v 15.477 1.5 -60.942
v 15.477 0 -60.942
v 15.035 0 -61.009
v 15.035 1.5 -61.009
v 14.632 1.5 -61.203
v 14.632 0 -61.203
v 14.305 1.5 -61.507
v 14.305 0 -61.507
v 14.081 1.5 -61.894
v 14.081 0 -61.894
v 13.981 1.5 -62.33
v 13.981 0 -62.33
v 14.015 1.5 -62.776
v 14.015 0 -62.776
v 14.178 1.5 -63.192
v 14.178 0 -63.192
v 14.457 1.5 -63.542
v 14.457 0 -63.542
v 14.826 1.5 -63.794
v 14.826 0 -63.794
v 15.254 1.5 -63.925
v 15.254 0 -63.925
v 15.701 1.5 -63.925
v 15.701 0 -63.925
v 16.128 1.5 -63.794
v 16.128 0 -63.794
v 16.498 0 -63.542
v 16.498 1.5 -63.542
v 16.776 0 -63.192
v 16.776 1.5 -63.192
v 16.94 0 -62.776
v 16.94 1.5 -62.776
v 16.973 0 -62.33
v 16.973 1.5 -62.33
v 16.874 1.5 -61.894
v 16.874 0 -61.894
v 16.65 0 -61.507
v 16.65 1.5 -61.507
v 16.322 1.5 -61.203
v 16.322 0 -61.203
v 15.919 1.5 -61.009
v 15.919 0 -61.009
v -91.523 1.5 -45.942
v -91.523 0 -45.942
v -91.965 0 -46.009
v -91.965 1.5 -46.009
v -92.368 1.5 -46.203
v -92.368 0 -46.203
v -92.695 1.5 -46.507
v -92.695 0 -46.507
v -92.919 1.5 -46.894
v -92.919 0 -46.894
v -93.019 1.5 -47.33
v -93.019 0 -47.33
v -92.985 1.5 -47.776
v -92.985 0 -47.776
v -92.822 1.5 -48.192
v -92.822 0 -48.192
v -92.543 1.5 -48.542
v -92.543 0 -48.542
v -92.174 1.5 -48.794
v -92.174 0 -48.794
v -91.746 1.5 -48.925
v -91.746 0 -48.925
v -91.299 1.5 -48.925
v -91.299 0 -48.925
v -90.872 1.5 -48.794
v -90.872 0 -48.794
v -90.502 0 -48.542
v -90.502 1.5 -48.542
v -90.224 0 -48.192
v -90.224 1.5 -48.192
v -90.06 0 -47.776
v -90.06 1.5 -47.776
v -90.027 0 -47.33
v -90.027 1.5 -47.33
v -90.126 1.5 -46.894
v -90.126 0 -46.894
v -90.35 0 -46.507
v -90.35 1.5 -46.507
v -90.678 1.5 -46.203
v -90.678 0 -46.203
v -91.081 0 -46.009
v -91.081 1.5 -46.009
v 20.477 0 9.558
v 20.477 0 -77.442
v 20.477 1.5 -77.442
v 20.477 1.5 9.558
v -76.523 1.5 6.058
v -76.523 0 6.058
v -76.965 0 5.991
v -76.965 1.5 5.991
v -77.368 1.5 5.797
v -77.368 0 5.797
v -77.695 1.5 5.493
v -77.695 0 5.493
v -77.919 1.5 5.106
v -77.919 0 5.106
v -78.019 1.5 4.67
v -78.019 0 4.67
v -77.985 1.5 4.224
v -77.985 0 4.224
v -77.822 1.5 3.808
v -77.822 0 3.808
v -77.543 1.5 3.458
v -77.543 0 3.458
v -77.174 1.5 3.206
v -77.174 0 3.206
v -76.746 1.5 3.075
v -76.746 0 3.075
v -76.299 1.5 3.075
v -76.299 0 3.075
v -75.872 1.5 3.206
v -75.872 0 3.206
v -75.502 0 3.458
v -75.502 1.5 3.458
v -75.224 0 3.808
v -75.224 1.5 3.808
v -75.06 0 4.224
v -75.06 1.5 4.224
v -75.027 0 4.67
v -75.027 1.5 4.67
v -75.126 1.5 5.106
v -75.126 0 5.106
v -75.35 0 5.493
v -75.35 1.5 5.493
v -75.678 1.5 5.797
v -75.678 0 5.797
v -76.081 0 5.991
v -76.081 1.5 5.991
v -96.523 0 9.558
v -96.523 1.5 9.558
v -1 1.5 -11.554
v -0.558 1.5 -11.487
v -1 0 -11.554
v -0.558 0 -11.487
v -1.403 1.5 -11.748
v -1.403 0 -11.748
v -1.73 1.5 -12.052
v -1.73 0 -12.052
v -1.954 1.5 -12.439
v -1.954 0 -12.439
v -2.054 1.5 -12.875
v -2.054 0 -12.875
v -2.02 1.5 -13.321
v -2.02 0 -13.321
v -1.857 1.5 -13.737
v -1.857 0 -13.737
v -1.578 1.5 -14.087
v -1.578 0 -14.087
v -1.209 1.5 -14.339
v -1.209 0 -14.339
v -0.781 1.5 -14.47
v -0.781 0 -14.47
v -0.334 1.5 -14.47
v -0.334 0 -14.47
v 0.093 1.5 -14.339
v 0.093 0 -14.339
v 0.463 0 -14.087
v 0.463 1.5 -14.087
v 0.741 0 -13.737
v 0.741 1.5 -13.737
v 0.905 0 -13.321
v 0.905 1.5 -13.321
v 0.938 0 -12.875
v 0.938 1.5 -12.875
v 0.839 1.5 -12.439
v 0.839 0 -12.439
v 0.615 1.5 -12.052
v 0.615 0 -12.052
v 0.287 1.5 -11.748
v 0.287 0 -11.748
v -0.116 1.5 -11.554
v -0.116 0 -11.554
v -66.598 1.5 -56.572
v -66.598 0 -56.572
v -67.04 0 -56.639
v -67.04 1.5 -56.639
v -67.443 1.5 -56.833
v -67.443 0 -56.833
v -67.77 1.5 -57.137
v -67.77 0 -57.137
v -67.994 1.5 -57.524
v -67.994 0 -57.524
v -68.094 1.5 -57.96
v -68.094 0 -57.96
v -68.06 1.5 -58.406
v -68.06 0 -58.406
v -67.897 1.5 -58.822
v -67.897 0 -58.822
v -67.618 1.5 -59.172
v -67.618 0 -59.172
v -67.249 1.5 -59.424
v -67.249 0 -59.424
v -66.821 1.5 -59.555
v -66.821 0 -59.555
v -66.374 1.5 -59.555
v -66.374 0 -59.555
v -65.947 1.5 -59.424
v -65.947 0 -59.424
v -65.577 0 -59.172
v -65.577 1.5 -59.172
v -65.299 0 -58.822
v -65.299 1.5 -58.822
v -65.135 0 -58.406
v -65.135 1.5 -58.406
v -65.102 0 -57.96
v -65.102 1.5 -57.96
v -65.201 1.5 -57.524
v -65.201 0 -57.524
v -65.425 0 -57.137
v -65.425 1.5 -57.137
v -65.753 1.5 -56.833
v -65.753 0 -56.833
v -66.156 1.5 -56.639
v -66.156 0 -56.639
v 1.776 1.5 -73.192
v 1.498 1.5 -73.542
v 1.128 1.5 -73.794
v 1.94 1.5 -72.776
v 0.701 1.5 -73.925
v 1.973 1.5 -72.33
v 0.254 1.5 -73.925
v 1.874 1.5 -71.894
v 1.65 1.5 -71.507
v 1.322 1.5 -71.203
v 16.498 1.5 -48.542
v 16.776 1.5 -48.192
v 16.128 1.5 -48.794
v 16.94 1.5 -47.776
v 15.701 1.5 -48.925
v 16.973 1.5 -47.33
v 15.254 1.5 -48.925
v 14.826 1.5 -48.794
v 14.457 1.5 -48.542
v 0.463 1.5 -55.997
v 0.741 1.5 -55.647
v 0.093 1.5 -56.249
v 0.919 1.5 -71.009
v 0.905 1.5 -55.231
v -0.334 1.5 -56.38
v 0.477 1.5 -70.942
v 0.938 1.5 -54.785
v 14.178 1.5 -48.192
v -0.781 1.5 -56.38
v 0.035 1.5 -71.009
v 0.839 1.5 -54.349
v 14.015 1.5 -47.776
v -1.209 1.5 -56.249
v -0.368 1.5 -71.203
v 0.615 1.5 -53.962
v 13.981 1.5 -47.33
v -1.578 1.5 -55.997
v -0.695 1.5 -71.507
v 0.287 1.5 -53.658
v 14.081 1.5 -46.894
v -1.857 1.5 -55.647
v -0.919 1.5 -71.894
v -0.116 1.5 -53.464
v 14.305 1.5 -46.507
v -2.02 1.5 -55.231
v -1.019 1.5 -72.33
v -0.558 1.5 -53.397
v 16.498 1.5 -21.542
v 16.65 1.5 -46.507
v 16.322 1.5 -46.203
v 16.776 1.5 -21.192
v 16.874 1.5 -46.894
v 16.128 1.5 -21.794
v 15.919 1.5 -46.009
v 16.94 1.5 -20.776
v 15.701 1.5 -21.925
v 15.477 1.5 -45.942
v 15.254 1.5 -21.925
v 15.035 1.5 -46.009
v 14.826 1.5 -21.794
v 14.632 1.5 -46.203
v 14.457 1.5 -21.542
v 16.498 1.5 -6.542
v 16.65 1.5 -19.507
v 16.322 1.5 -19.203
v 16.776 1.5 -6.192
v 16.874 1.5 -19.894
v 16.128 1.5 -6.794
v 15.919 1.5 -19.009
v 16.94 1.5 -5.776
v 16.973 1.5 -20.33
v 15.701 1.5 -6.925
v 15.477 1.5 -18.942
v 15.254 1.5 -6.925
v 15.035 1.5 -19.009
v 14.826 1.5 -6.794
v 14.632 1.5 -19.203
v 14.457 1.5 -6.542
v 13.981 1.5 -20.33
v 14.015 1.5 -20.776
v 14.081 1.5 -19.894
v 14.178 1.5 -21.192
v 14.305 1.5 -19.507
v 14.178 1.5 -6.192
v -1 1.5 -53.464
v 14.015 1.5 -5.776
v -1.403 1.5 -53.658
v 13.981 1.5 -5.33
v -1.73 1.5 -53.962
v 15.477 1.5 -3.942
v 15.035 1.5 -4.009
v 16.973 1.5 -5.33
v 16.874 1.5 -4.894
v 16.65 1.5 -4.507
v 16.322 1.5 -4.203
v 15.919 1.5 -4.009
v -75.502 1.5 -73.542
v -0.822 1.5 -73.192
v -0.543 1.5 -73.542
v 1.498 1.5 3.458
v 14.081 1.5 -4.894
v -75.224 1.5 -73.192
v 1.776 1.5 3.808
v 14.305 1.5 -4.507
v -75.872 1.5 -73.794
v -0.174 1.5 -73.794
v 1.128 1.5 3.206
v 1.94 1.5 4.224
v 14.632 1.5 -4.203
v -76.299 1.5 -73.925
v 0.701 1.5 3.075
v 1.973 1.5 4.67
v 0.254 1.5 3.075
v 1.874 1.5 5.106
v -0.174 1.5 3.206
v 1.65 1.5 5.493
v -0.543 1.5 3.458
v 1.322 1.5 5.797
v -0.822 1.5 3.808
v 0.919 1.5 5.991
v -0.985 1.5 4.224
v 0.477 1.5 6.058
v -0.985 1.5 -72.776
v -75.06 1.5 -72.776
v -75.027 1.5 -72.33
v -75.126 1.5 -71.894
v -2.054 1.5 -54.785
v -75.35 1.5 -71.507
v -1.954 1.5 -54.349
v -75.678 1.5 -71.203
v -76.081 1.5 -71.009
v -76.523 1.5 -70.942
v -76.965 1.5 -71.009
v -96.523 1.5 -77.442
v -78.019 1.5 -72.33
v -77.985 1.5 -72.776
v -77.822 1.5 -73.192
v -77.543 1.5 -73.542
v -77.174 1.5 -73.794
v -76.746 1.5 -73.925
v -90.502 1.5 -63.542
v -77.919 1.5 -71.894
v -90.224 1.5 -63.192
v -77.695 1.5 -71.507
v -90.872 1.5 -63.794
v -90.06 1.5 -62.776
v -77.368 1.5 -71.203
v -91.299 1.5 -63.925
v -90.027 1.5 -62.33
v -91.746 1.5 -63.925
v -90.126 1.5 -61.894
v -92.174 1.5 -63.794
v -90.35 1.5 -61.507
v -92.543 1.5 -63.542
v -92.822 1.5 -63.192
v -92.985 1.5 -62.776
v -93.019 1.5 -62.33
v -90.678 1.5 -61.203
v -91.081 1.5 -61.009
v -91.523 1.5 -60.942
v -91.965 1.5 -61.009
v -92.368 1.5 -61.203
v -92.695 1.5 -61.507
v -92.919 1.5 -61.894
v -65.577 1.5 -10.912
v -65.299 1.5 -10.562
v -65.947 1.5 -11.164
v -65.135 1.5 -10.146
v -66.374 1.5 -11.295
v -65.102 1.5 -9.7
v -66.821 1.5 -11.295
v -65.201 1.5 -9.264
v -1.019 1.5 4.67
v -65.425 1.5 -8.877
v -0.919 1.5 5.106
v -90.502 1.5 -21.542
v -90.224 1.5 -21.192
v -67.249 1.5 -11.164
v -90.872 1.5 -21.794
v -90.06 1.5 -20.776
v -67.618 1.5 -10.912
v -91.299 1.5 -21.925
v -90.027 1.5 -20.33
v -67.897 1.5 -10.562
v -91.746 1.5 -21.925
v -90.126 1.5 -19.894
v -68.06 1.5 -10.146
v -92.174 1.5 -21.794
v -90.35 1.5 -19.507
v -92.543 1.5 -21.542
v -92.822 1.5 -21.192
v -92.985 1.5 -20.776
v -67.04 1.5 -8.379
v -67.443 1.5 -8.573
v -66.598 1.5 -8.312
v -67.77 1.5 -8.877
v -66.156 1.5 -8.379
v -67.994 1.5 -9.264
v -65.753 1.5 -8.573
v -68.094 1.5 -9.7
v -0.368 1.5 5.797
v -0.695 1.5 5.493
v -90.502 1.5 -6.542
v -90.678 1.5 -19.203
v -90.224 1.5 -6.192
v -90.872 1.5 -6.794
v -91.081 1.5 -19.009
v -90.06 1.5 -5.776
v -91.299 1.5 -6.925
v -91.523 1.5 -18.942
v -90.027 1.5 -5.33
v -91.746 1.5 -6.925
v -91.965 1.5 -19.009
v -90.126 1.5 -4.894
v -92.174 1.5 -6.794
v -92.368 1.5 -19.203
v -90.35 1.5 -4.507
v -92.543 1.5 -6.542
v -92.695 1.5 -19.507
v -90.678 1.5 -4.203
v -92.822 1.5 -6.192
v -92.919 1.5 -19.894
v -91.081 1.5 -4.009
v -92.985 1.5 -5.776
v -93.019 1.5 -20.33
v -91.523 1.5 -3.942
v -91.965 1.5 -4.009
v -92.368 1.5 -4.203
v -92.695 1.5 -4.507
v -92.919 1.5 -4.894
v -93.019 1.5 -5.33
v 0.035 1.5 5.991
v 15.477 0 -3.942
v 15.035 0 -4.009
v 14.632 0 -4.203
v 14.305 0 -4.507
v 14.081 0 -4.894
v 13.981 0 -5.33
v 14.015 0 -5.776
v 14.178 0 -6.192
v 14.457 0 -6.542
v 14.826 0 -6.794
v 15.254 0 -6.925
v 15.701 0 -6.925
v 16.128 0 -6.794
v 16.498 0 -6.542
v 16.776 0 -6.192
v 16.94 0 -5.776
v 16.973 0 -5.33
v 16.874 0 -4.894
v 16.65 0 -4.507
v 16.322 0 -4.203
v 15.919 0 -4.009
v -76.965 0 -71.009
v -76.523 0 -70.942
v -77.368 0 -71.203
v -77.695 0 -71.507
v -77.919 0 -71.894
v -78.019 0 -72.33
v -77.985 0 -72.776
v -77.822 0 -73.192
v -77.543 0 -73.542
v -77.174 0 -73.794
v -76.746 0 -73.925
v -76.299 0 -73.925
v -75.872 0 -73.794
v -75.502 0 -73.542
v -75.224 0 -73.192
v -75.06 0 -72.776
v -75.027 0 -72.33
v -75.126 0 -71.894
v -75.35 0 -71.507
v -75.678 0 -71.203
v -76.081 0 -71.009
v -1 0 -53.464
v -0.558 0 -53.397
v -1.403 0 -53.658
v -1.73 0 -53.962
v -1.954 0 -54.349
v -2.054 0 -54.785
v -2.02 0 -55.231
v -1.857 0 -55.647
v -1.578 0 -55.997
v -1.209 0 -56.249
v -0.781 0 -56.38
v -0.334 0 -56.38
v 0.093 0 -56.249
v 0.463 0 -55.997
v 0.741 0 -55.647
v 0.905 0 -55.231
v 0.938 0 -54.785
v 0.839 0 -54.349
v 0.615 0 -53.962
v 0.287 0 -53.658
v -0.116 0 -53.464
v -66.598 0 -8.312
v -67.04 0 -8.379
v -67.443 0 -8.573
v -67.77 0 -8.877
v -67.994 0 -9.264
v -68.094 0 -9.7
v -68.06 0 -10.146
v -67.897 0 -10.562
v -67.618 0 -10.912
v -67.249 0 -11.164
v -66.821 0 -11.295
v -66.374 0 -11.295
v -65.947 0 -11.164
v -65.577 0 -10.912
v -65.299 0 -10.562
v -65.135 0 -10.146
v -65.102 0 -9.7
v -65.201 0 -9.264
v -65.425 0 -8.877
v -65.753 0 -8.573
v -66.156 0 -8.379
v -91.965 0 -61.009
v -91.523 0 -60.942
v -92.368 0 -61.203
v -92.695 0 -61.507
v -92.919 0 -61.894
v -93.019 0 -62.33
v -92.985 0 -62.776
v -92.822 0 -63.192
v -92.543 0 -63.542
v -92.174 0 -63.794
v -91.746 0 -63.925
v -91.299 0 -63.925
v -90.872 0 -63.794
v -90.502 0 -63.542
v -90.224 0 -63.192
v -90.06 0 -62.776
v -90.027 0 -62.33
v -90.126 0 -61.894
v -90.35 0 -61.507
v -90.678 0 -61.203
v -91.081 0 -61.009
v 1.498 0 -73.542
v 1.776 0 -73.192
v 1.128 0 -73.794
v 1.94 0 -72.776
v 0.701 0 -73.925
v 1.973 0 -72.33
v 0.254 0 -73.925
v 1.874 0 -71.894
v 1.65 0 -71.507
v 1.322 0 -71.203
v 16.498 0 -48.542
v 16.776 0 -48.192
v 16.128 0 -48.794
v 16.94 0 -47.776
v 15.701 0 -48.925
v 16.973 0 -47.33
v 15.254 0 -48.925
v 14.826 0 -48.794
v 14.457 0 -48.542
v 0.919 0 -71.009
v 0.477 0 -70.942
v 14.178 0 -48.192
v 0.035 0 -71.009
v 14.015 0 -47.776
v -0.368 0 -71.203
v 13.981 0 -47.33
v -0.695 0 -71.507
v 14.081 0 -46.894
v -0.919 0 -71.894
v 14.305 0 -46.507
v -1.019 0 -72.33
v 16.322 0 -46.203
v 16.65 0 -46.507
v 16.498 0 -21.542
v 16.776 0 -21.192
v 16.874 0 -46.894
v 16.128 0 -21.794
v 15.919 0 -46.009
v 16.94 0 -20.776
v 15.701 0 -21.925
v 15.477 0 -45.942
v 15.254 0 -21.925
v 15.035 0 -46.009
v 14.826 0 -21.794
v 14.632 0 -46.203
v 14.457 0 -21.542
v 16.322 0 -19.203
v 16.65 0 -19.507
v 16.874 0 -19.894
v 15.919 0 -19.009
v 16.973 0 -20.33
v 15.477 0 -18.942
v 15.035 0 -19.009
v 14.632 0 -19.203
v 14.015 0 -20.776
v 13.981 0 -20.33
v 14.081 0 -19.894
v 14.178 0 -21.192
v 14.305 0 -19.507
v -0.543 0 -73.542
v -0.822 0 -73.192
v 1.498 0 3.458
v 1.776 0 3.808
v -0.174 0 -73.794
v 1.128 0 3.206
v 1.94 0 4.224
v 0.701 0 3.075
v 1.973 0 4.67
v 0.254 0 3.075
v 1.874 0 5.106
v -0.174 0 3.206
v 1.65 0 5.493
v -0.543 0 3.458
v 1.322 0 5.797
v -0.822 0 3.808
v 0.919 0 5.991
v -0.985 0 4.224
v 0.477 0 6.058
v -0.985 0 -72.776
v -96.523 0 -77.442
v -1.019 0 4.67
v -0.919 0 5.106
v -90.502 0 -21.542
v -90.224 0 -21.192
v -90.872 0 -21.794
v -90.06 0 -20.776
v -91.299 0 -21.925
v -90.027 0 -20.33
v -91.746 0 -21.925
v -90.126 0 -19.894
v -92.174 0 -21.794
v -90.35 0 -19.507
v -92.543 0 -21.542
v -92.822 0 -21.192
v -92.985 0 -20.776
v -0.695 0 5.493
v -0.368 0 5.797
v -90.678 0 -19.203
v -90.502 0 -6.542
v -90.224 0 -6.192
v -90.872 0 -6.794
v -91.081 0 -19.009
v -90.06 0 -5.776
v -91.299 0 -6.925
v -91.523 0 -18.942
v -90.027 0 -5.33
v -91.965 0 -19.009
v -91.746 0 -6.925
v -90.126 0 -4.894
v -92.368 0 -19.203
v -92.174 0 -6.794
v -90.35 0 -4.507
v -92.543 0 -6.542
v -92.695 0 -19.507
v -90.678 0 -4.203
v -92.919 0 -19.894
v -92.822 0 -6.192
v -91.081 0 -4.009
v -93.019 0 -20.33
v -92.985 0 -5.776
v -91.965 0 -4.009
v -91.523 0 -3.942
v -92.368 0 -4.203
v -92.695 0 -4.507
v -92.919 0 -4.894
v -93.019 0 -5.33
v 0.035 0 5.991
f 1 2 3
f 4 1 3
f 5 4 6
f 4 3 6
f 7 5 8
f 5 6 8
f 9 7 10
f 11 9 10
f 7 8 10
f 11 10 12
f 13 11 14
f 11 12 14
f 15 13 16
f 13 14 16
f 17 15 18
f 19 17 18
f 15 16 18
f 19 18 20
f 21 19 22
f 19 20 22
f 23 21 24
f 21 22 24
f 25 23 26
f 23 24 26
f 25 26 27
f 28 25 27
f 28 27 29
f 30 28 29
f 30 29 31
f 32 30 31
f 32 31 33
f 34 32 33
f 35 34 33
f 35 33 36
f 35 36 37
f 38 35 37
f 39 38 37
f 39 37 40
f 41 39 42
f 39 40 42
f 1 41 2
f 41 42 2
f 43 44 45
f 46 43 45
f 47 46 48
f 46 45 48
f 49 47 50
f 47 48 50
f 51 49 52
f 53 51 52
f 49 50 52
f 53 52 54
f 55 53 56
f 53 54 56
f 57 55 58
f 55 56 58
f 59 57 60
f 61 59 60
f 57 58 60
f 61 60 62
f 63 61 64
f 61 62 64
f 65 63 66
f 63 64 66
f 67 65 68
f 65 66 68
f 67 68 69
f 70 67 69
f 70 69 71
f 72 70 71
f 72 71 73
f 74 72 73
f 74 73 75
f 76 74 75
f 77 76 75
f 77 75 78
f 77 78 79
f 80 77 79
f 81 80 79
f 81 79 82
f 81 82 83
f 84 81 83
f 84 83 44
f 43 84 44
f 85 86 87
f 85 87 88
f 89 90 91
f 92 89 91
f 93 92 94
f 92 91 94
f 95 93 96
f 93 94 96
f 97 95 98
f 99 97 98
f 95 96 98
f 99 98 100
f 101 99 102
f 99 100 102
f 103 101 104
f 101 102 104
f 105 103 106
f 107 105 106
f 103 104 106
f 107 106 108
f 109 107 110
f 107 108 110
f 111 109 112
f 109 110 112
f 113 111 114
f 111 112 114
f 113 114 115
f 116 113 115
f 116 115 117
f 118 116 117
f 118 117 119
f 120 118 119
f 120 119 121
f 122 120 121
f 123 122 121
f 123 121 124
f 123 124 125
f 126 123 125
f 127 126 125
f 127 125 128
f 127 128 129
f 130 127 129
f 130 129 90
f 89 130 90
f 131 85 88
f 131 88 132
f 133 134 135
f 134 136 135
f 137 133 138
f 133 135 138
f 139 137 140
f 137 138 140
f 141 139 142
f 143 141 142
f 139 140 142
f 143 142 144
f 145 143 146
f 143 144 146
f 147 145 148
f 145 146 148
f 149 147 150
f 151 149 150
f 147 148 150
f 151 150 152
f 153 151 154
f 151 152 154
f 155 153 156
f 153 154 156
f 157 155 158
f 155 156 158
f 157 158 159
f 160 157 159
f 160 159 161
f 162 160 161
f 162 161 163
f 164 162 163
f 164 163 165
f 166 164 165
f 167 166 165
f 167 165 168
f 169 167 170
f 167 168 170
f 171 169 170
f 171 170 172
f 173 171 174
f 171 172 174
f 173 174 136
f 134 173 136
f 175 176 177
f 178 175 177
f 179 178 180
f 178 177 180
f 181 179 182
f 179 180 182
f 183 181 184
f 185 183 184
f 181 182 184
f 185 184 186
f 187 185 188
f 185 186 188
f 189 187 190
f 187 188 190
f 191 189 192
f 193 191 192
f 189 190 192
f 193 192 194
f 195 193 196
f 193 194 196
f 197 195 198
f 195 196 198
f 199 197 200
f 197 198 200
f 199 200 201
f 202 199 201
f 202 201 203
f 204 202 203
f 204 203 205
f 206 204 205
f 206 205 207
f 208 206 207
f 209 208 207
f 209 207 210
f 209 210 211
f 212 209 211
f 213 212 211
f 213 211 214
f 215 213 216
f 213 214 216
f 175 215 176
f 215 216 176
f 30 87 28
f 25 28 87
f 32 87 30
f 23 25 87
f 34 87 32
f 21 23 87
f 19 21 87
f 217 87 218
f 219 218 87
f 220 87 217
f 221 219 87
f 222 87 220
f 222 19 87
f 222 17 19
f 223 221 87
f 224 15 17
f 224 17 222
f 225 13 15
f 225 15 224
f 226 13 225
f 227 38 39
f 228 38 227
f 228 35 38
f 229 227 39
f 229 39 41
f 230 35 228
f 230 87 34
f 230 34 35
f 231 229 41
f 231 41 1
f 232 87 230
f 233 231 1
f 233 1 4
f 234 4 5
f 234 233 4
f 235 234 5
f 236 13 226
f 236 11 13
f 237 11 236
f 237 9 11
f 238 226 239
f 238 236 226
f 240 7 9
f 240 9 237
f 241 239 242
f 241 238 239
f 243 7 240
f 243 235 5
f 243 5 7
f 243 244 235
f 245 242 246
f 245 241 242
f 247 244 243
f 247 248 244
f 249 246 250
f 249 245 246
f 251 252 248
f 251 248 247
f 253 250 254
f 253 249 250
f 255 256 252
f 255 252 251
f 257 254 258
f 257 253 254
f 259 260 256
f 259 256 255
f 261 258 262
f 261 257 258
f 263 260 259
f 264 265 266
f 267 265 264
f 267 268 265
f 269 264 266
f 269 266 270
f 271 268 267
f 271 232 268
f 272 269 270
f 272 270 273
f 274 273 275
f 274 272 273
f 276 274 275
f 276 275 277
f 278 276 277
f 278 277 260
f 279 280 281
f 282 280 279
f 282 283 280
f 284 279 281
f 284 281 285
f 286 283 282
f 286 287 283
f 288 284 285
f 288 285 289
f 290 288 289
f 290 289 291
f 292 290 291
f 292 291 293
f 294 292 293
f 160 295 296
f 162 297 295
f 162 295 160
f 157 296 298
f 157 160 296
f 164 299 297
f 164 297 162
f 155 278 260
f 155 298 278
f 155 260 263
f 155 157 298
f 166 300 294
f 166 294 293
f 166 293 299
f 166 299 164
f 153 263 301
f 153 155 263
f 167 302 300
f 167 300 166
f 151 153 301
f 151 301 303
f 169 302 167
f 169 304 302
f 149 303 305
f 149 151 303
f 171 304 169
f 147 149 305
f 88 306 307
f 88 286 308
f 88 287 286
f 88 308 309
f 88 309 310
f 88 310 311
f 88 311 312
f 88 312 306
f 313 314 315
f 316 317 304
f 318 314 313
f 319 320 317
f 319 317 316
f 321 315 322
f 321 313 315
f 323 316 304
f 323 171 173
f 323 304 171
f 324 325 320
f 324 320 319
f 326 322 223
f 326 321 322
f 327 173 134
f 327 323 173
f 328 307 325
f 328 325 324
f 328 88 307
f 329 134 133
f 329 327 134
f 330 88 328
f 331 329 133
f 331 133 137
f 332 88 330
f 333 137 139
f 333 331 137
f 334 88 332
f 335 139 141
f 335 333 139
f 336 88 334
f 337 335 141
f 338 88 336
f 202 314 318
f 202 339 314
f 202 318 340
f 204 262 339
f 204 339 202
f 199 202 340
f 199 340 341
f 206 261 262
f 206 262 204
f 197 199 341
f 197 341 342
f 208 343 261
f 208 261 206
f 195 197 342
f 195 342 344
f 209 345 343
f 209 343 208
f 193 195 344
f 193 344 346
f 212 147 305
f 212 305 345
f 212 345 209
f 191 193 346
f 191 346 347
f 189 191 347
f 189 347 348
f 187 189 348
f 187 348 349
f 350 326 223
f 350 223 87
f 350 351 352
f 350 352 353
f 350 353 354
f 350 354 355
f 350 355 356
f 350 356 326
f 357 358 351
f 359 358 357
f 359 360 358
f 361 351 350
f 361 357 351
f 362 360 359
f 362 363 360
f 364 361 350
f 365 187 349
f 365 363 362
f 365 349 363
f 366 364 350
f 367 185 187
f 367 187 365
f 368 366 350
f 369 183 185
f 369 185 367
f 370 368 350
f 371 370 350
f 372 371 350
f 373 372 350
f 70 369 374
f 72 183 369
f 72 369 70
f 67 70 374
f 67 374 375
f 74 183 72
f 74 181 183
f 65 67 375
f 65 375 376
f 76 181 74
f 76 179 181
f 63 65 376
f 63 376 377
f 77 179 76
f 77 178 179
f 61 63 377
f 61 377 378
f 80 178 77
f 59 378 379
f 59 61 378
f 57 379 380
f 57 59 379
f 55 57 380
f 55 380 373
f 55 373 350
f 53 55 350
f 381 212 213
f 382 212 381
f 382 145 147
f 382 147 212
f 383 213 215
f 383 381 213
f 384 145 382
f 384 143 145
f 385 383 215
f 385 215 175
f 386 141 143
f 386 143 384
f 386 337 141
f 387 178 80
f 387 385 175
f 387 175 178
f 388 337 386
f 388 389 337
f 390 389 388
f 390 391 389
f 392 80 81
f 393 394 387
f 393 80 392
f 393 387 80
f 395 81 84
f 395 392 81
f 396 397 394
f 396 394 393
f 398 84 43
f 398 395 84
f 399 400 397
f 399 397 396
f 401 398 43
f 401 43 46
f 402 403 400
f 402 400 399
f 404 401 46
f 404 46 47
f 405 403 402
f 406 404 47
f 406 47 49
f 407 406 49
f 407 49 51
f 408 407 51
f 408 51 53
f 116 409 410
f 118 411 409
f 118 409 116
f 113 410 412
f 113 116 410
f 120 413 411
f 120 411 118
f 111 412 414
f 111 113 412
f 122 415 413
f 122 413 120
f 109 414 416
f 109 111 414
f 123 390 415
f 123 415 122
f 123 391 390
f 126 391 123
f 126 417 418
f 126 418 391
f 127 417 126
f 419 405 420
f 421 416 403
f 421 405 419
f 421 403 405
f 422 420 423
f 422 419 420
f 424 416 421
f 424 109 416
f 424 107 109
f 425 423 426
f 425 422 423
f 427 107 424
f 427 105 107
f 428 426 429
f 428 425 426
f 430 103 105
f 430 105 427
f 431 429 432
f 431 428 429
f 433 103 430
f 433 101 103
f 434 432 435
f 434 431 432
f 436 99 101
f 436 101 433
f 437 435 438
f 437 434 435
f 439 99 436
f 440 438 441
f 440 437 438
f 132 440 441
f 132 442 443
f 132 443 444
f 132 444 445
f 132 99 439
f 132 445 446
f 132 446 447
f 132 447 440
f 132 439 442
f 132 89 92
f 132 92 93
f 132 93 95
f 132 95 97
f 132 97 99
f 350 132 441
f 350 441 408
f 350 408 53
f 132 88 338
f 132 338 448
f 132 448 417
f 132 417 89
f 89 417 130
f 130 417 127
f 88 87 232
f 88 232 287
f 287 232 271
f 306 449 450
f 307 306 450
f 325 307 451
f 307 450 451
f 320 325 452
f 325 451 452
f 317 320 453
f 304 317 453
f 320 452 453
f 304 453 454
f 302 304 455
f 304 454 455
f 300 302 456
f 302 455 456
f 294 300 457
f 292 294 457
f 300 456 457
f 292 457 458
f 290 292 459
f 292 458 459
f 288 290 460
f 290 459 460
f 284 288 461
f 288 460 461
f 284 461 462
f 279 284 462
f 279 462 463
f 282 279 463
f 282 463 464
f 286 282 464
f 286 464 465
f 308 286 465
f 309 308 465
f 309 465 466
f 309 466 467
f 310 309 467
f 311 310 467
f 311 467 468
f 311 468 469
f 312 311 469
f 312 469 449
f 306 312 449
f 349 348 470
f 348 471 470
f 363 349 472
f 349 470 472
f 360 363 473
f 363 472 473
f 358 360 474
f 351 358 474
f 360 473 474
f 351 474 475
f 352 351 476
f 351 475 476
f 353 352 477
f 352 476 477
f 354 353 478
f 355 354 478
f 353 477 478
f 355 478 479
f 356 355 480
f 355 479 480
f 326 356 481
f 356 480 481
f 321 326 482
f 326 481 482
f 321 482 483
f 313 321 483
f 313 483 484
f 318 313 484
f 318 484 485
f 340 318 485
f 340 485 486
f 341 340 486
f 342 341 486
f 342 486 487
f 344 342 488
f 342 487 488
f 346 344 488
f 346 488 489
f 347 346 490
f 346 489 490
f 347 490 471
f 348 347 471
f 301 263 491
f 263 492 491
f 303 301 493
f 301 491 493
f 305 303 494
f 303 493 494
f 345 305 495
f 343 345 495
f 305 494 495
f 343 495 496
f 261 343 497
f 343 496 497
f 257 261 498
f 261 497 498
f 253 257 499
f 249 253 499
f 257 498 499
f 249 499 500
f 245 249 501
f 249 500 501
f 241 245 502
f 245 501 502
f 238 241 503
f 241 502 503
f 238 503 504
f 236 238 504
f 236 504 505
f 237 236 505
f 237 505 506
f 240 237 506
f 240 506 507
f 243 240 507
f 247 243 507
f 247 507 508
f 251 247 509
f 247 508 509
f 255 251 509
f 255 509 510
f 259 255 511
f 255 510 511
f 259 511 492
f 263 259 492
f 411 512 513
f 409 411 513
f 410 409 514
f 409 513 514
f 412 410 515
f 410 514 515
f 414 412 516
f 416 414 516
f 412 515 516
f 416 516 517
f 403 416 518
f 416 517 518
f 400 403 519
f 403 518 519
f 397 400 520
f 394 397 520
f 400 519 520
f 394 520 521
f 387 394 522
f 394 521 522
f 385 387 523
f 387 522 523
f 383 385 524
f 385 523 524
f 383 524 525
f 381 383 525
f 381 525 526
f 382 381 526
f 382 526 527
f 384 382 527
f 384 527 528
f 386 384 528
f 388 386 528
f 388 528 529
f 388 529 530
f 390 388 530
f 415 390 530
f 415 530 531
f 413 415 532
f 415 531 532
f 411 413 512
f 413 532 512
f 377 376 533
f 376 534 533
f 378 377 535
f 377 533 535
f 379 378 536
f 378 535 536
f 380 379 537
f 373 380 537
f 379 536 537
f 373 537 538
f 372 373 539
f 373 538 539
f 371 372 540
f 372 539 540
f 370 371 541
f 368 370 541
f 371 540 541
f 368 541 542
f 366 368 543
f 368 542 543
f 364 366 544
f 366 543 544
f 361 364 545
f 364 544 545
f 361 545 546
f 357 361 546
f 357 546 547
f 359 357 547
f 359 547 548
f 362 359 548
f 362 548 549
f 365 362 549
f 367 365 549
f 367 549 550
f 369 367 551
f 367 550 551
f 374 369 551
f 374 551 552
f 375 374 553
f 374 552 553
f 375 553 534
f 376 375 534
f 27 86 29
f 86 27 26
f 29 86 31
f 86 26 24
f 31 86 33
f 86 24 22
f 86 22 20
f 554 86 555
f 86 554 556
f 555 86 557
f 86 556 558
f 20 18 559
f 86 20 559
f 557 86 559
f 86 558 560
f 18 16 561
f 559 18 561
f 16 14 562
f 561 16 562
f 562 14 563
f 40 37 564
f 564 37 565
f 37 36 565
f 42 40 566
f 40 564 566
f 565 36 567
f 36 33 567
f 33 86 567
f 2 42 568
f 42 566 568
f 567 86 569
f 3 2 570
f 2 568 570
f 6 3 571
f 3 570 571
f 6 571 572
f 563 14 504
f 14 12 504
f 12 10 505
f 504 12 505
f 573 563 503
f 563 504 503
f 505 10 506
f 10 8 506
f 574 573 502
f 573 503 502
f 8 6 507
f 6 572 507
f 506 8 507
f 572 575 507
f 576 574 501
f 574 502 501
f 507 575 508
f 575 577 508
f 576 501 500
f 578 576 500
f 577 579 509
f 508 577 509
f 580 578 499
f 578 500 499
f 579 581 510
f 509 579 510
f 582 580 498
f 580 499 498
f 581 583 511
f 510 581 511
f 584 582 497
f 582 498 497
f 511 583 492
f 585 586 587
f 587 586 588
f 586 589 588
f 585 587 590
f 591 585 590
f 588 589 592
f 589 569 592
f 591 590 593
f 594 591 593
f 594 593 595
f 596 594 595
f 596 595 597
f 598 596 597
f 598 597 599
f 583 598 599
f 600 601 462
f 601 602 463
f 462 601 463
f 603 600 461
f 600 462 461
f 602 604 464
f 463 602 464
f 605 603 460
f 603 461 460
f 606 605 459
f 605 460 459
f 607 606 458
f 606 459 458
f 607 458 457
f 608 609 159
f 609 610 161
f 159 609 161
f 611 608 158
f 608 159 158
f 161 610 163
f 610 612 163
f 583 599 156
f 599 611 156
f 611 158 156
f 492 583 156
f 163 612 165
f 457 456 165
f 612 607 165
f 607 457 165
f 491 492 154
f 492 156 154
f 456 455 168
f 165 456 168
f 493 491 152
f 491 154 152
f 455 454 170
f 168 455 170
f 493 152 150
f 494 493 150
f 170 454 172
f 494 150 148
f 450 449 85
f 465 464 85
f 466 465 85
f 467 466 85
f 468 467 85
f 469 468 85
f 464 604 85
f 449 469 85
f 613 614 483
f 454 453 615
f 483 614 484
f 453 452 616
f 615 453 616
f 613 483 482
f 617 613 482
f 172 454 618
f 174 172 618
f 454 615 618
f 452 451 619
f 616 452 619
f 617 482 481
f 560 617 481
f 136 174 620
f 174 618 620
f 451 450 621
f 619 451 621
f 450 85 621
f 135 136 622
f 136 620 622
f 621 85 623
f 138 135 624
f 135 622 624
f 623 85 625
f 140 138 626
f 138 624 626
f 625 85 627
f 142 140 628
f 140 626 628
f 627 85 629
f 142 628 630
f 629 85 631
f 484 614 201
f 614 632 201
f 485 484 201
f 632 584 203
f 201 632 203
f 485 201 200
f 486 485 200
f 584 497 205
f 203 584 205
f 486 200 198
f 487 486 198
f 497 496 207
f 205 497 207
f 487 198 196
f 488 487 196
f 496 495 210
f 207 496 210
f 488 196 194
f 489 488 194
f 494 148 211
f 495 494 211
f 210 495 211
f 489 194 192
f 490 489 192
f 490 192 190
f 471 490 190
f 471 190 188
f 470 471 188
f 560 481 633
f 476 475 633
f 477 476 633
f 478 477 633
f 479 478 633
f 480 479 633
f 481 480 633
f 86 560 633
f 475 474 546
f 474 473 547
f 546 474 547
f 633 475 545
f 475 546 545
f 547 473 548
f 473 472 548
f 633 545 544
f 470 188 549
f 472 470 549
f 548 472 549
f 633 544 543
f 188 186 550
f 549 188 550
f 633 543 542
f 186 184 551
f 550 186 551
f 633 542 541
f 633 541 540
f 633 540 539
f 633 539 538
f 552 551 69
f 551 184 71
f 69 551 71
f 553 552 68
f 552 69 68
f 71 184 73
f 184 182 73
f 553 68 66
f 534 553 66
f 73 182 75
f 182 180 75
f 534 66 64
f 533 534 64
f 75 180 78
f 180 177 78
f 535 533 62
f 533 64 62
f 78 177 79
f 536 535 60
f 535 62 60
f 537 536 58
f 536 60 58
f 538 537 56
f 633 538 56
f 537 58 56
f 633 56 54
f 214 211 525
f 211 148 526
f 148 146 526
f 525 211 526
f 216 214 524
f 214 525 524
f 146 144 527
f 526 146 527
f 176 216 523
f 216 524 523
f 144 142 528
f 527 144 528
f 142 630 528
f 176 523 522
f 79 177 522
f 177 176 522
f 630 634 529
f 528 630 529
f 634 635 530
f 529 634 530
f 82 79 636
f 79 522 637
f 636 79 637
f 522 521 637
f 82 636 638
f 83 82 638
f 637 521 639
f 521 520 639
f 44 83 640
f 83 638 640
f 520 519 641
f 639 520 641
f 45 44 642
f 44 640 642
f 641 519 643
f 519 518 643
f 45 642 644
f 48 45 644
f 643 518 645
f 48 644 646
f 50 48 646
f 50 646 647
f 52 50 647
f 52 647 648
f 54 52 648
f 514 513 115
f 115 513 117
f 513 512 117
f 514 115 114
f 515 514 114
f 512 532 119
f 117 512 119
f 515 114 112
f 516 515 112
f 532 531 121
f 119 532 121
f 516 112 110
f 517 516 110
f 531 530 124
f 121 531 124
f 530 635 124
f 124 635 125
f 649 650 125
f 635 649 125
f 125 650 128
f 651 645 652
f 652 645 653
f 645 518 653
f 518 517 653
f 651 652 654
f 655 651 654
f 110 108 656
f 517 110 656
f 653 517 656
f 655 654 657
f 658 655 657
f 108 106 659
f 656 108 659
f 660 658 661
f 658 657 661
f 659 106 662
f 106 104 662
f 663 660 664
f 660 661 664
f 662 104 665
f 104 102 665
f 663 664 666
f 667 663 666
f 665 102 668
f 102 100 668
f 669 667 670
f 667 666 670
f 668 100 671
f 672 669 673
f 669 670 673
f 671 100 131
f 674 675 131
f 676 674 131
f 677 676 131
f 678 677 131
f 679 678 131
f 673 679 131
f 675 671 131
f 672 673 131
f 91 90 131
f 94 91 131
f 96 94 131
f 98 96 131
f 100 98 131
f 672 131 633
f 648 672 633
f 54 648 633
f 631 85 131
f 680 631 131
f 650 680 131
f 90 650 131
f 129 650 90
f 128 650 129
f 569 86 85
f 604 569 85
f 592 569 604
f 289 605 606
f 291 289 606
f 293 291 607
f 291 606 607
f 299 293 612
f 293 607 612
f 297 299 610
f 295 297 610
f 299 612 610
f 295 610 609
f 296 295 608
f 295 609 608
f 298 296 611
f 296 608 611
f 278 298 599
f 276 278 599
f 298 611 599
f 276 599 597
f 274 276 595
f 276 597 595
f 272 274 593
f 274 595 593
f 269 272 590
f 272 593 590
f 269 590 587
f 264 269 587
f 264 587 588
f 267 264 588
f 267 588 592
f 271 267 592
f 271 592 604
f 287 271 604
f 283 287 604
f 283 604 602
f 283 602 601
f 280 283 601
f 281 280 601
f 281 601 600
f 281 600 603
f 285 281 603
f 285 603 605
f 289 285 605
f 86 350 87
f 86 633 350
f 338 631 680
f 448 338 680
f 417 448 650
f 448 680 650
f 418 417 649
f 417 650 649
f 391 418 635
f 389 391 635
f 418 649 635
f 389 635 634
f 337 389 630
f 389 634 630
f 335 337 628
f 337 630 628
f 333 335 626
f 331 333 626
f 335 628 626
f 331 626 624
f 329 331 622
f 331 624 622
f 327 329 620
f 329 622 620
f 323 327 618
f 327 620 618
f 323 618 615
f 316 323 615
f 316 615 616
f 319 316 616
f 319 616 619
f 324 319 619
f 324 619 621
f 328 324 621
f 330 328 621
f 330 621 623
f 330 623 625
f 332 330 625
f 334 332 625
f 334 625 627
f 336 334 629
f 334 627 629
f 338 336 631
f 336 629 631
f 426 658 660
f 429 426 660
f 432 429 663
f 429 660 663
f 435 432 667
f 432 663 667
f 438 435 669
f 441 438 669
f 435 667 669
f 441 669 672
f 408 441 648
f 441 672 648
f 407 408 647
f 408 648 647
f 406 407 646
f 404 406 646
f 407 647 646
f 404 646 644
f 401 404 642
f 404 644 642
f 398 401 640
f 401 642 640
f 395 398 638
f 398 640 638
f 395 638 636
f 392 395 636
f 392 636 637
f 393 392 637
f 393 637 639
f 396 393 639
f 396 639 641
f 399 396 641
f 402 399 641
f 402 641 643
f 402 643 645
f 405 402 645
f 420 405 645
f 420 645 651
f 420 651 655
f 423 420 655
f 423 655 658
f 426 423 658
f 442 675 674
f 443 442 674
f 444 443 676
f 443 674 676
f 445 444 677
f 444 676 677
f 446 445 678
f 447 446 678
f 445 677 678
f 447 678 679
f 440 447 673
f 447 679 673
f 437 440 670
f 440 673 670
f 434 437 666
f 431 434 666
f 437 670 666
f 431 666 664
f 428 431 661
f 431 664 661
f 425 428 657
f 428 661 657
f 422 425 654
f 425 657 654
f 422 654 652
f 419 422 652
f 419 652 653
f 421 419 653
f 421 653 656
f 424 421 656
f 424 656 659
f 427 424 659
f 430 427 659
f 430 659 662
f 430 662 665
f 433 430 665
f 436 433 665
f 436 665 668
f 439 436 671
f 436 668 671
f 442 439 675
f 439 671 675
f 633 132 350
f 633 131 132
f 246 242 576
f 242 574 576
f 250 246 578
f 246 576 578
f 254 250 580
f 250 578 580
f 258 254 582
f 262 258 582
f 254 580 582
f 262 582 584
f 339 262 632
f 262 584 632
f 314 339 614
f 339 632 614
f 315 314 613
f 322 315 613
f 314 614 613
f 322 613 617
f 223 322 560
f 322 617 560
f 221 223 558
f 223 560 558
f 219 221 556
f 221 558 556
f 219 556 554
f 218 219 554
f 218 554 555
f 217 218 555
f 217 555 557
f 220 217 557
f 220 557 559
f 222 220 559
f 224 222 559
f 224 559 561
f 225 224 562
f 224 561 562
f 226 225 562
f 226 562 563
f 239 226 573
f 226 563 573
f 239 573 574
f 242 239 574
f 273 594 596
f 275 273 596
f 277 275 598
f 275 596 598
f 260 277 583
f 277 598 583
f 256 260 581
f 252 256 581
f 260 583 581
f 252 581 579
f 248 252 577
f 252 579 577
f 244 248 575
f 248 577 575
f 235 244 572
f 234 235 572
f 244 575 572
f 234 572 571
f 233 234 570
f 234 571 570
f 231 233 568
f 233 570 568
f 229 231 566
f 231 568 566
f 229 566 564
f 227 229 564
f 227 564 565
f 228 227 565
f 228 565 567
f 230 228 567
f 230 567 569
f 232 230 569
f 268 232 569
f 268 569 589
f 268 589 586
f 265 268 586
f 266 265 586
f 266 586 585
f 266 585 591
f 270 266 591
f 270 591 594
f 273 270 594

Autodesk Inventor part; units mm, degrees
ref_plane "YZ Plane" through (0, 0, 0) normal (1, 0, 0) x (0, 1, 0)
ref_plane "XZ Plane" through (0, 0, 0) normal (0, 1, 0) x (-1, 0, 0)
ref_plane "XY Plane" through (0, 0, 0) normal (0, 0, 1) x (1, 0, 0)
sketch "スケッチ1" plane through (0, 0, 0) normal (0, 1, 0) x (-1, 0, 0)
  line L0 (-20.4773, 9.5578) -> (96.5227, 9.5578)
  line L1 (96.5227, 9.5578) -> (96.5227, -77.4422)
  line L2 (96.5227, -77.4422) -> (-20.4773, -77.4422)
  line L3 (-20.4773, -77.4422) -> (-20.4773, 9.5578)
  point P0 (0, 0)
  dimension "d0" = 117
  dimension "d1" = 87
extrude "押し出し1" add sketch "スケッチ1" along normal blind 1.5
sketch "スケッチ2" plane through (0, 1.5, 0) normal (0, 1, 0) x (1, 0, 0)
  line L0 (-96.5227, -9.5578) -> (20.4773, -9.5578) projected
  line L1 (20.4773, -9.5578) -> (20.4773, 77.4422) projected
  line L2 (20.4773, 77.4422) -> (-96.5227, 77.4422) projected
  line L3 (-96.5227, 77.4422) -> (-96.5227, -9.5578) projected
  point P0 (0, 0)
  point P1 (-76.5227, 72.4422)
  point P2 (0.4773, 72.4422)
  point P3 (-76.5227, -4.5578)
  point P4 (0.4773, -4.5578)
  dimension "d4" = 5
  dimension "d5" = 5
  dimension "d6" = 5
  dimension "d7" = 5
  dimension "d8" = 20
  dimension "d9" = 20
  dimension "d10" = 20
  dimension "d11" = 20
hole "穴1" at (-76.5227, 1.5, -72.4422) at (0.4773, 1.5, -72.4422) at (-76.5227, 1.5, 4.5578) at (0.4773, 1.5, 4.5578) direction (0, -1, 0) diameter 3 end through all
sketch "スケッチ3" plane through (0, 1.5, 0) normal (0, 1, 0) x (1, 0, 0)
  line L0 (-96.5227, -9.5578) -> (20.4773, -9.5578) projected
  line L1 (20.4773, -9.5578) -> (20.4773, 77.4422) projected
  line L2 (20.4773, 77.4422) -> (-96.5227, 77.4422) projected
  line L3 (-96.5227, 77.4422) -> (-96.5227, -9.5578) projected
  point P0 (0, 0)
  point P1 (-91.5227, 47.4422)
  point P2 (-91.5227, 47.4422)
  point P3 (-91.5227, 62.4422)
  point P4 (-91.5227, 20.4422)
  point P5 (-91.5227, 5.4422)
  point P6 (15.4773, 62.4422)
  point P7 (15.4773, 47.4422)
  point P8 (15.4773, 20.4422)
  point P9 (15.4773, 5.4422)
  dimension "d19" = 5
  dimension "d20" = 5
  dimension "d21" = 5
  dimension "d22" = 5
  dimension "d23" = 30
  dimension "d24" = 15
  dimension "d25" = 15
  dimension "d26" = 30
  dimension "d27" = 15
  dimension "d28" = 30
  dimension "d29" = 15
  dimension "d30" = 30
  dimension "d31" = 5
  dimension "d32" = 5
  dimension "d33" = 5
  dimension "d34" = 5
hole "穴2" at (-91.5227, 1.5, -47.4422) at (-91.5227, 1.5, -62.4422) at (-91.5227, 1.5, -20.4422) at (-91.5227, 1.5, -5.4422) at (15.4773, 1.5, -62.4422) at (15.4773, 1.5, -47.4422) at (15.4773, 1.5, -20.4422) at (15.4773, 1.5, -5.4422) direction (0, -1, 0) diameter 3 end through all
sketch "スケッチ4" plane through (0, 1.5, 0) normal (0, 1, 0) x (1, 0, 0)
  line L0 (20.4773, -9.5578) -> (20.4773, 77.4422) projected
  line L1 (20.4773, 77.4422) -> (-96.5227, 77.4422) projected
  line L2 (5.1573, 61.2472) -> (-81.2027, 61.2472)
  line L3 (-81.2027, 61.2472) -> (-81.2027, 6.6372)
  line L4 (-81.2027, 61.2472) -> (5.1573, 61.2472)
  line L5 (5.1573, 6.6372) -> (-81.2027, 6.6372)
  line L6 (-81.2027, 6.6372) -> (-81.2027, 61.2472)
  line L7 (-81.2027, 6.6372) -> (5.1573, 6.6372)
  line L8 (5.1573, 6.6372) -> (5.1573, 61.2472)
  point P0 (-96.5227, -9.5578)
  point P1 (0, 0)
  point P2 (0, 0)
  point P3 (0, 0)
  point P4 (-0.5577, 54.8972)
  point P5 (-0.5577, 12.9872)
  point P6 (-66.5977, 9.8122)
  point P7 (-66.5977, 58.0722)
  dimension "d42" = 86.36
  dimension "d43" = 54.61
  dimension "d44" = 14.605
  dimension "d45" = 3.175
  dimension "d46" = 3.175
  dimension "d47" = 14.605
  dimension "d48" = 6.35
  dimension "d50" = 6.35
  dimension "d52" = 0
  dimension "d53" = 0
  dimension "d54" = 87
  dimension "d55" = 16.195
  dimension "d56" = 117
  dimension "d58" = 15.32
  dimension "d59" = 5.715
  dimension "d60" = 5.715
  dimension "d61" = 66.04
  dimension "d62" = 66.04
hole "穴3" at (-66.5977, 1.5, -58.0722) at (-66.5977, 1.5, -9.8122) at (-0.5577, 1.5, -12.9872) at (-0.5577, 1.5, -54.8972) direction (0, -1, 0) diameter 3 end through all
equation "\"d5\" = d4"
equation "\"d6\" = d4"
equation "\"d7\" = d6"
equation "\"d9\" = d8"
equation "\"d10\" = d8"
equation "\"d11\" = d9"
equation "\"d20\" = d19"
equation "\"d21\" = d20"
equation "\"d22\" = d20"
equation "\"d32\" = d31"
equation "\"d33\" = d32"
equation "\"d34\" = d33"
equation "\"d55\" = 0.5 * d54 - 0.5 * d43"
equation "\"d58\" = 0.5 * d56 - 0.5 * d42"
properties part number "バッテリー固定"
